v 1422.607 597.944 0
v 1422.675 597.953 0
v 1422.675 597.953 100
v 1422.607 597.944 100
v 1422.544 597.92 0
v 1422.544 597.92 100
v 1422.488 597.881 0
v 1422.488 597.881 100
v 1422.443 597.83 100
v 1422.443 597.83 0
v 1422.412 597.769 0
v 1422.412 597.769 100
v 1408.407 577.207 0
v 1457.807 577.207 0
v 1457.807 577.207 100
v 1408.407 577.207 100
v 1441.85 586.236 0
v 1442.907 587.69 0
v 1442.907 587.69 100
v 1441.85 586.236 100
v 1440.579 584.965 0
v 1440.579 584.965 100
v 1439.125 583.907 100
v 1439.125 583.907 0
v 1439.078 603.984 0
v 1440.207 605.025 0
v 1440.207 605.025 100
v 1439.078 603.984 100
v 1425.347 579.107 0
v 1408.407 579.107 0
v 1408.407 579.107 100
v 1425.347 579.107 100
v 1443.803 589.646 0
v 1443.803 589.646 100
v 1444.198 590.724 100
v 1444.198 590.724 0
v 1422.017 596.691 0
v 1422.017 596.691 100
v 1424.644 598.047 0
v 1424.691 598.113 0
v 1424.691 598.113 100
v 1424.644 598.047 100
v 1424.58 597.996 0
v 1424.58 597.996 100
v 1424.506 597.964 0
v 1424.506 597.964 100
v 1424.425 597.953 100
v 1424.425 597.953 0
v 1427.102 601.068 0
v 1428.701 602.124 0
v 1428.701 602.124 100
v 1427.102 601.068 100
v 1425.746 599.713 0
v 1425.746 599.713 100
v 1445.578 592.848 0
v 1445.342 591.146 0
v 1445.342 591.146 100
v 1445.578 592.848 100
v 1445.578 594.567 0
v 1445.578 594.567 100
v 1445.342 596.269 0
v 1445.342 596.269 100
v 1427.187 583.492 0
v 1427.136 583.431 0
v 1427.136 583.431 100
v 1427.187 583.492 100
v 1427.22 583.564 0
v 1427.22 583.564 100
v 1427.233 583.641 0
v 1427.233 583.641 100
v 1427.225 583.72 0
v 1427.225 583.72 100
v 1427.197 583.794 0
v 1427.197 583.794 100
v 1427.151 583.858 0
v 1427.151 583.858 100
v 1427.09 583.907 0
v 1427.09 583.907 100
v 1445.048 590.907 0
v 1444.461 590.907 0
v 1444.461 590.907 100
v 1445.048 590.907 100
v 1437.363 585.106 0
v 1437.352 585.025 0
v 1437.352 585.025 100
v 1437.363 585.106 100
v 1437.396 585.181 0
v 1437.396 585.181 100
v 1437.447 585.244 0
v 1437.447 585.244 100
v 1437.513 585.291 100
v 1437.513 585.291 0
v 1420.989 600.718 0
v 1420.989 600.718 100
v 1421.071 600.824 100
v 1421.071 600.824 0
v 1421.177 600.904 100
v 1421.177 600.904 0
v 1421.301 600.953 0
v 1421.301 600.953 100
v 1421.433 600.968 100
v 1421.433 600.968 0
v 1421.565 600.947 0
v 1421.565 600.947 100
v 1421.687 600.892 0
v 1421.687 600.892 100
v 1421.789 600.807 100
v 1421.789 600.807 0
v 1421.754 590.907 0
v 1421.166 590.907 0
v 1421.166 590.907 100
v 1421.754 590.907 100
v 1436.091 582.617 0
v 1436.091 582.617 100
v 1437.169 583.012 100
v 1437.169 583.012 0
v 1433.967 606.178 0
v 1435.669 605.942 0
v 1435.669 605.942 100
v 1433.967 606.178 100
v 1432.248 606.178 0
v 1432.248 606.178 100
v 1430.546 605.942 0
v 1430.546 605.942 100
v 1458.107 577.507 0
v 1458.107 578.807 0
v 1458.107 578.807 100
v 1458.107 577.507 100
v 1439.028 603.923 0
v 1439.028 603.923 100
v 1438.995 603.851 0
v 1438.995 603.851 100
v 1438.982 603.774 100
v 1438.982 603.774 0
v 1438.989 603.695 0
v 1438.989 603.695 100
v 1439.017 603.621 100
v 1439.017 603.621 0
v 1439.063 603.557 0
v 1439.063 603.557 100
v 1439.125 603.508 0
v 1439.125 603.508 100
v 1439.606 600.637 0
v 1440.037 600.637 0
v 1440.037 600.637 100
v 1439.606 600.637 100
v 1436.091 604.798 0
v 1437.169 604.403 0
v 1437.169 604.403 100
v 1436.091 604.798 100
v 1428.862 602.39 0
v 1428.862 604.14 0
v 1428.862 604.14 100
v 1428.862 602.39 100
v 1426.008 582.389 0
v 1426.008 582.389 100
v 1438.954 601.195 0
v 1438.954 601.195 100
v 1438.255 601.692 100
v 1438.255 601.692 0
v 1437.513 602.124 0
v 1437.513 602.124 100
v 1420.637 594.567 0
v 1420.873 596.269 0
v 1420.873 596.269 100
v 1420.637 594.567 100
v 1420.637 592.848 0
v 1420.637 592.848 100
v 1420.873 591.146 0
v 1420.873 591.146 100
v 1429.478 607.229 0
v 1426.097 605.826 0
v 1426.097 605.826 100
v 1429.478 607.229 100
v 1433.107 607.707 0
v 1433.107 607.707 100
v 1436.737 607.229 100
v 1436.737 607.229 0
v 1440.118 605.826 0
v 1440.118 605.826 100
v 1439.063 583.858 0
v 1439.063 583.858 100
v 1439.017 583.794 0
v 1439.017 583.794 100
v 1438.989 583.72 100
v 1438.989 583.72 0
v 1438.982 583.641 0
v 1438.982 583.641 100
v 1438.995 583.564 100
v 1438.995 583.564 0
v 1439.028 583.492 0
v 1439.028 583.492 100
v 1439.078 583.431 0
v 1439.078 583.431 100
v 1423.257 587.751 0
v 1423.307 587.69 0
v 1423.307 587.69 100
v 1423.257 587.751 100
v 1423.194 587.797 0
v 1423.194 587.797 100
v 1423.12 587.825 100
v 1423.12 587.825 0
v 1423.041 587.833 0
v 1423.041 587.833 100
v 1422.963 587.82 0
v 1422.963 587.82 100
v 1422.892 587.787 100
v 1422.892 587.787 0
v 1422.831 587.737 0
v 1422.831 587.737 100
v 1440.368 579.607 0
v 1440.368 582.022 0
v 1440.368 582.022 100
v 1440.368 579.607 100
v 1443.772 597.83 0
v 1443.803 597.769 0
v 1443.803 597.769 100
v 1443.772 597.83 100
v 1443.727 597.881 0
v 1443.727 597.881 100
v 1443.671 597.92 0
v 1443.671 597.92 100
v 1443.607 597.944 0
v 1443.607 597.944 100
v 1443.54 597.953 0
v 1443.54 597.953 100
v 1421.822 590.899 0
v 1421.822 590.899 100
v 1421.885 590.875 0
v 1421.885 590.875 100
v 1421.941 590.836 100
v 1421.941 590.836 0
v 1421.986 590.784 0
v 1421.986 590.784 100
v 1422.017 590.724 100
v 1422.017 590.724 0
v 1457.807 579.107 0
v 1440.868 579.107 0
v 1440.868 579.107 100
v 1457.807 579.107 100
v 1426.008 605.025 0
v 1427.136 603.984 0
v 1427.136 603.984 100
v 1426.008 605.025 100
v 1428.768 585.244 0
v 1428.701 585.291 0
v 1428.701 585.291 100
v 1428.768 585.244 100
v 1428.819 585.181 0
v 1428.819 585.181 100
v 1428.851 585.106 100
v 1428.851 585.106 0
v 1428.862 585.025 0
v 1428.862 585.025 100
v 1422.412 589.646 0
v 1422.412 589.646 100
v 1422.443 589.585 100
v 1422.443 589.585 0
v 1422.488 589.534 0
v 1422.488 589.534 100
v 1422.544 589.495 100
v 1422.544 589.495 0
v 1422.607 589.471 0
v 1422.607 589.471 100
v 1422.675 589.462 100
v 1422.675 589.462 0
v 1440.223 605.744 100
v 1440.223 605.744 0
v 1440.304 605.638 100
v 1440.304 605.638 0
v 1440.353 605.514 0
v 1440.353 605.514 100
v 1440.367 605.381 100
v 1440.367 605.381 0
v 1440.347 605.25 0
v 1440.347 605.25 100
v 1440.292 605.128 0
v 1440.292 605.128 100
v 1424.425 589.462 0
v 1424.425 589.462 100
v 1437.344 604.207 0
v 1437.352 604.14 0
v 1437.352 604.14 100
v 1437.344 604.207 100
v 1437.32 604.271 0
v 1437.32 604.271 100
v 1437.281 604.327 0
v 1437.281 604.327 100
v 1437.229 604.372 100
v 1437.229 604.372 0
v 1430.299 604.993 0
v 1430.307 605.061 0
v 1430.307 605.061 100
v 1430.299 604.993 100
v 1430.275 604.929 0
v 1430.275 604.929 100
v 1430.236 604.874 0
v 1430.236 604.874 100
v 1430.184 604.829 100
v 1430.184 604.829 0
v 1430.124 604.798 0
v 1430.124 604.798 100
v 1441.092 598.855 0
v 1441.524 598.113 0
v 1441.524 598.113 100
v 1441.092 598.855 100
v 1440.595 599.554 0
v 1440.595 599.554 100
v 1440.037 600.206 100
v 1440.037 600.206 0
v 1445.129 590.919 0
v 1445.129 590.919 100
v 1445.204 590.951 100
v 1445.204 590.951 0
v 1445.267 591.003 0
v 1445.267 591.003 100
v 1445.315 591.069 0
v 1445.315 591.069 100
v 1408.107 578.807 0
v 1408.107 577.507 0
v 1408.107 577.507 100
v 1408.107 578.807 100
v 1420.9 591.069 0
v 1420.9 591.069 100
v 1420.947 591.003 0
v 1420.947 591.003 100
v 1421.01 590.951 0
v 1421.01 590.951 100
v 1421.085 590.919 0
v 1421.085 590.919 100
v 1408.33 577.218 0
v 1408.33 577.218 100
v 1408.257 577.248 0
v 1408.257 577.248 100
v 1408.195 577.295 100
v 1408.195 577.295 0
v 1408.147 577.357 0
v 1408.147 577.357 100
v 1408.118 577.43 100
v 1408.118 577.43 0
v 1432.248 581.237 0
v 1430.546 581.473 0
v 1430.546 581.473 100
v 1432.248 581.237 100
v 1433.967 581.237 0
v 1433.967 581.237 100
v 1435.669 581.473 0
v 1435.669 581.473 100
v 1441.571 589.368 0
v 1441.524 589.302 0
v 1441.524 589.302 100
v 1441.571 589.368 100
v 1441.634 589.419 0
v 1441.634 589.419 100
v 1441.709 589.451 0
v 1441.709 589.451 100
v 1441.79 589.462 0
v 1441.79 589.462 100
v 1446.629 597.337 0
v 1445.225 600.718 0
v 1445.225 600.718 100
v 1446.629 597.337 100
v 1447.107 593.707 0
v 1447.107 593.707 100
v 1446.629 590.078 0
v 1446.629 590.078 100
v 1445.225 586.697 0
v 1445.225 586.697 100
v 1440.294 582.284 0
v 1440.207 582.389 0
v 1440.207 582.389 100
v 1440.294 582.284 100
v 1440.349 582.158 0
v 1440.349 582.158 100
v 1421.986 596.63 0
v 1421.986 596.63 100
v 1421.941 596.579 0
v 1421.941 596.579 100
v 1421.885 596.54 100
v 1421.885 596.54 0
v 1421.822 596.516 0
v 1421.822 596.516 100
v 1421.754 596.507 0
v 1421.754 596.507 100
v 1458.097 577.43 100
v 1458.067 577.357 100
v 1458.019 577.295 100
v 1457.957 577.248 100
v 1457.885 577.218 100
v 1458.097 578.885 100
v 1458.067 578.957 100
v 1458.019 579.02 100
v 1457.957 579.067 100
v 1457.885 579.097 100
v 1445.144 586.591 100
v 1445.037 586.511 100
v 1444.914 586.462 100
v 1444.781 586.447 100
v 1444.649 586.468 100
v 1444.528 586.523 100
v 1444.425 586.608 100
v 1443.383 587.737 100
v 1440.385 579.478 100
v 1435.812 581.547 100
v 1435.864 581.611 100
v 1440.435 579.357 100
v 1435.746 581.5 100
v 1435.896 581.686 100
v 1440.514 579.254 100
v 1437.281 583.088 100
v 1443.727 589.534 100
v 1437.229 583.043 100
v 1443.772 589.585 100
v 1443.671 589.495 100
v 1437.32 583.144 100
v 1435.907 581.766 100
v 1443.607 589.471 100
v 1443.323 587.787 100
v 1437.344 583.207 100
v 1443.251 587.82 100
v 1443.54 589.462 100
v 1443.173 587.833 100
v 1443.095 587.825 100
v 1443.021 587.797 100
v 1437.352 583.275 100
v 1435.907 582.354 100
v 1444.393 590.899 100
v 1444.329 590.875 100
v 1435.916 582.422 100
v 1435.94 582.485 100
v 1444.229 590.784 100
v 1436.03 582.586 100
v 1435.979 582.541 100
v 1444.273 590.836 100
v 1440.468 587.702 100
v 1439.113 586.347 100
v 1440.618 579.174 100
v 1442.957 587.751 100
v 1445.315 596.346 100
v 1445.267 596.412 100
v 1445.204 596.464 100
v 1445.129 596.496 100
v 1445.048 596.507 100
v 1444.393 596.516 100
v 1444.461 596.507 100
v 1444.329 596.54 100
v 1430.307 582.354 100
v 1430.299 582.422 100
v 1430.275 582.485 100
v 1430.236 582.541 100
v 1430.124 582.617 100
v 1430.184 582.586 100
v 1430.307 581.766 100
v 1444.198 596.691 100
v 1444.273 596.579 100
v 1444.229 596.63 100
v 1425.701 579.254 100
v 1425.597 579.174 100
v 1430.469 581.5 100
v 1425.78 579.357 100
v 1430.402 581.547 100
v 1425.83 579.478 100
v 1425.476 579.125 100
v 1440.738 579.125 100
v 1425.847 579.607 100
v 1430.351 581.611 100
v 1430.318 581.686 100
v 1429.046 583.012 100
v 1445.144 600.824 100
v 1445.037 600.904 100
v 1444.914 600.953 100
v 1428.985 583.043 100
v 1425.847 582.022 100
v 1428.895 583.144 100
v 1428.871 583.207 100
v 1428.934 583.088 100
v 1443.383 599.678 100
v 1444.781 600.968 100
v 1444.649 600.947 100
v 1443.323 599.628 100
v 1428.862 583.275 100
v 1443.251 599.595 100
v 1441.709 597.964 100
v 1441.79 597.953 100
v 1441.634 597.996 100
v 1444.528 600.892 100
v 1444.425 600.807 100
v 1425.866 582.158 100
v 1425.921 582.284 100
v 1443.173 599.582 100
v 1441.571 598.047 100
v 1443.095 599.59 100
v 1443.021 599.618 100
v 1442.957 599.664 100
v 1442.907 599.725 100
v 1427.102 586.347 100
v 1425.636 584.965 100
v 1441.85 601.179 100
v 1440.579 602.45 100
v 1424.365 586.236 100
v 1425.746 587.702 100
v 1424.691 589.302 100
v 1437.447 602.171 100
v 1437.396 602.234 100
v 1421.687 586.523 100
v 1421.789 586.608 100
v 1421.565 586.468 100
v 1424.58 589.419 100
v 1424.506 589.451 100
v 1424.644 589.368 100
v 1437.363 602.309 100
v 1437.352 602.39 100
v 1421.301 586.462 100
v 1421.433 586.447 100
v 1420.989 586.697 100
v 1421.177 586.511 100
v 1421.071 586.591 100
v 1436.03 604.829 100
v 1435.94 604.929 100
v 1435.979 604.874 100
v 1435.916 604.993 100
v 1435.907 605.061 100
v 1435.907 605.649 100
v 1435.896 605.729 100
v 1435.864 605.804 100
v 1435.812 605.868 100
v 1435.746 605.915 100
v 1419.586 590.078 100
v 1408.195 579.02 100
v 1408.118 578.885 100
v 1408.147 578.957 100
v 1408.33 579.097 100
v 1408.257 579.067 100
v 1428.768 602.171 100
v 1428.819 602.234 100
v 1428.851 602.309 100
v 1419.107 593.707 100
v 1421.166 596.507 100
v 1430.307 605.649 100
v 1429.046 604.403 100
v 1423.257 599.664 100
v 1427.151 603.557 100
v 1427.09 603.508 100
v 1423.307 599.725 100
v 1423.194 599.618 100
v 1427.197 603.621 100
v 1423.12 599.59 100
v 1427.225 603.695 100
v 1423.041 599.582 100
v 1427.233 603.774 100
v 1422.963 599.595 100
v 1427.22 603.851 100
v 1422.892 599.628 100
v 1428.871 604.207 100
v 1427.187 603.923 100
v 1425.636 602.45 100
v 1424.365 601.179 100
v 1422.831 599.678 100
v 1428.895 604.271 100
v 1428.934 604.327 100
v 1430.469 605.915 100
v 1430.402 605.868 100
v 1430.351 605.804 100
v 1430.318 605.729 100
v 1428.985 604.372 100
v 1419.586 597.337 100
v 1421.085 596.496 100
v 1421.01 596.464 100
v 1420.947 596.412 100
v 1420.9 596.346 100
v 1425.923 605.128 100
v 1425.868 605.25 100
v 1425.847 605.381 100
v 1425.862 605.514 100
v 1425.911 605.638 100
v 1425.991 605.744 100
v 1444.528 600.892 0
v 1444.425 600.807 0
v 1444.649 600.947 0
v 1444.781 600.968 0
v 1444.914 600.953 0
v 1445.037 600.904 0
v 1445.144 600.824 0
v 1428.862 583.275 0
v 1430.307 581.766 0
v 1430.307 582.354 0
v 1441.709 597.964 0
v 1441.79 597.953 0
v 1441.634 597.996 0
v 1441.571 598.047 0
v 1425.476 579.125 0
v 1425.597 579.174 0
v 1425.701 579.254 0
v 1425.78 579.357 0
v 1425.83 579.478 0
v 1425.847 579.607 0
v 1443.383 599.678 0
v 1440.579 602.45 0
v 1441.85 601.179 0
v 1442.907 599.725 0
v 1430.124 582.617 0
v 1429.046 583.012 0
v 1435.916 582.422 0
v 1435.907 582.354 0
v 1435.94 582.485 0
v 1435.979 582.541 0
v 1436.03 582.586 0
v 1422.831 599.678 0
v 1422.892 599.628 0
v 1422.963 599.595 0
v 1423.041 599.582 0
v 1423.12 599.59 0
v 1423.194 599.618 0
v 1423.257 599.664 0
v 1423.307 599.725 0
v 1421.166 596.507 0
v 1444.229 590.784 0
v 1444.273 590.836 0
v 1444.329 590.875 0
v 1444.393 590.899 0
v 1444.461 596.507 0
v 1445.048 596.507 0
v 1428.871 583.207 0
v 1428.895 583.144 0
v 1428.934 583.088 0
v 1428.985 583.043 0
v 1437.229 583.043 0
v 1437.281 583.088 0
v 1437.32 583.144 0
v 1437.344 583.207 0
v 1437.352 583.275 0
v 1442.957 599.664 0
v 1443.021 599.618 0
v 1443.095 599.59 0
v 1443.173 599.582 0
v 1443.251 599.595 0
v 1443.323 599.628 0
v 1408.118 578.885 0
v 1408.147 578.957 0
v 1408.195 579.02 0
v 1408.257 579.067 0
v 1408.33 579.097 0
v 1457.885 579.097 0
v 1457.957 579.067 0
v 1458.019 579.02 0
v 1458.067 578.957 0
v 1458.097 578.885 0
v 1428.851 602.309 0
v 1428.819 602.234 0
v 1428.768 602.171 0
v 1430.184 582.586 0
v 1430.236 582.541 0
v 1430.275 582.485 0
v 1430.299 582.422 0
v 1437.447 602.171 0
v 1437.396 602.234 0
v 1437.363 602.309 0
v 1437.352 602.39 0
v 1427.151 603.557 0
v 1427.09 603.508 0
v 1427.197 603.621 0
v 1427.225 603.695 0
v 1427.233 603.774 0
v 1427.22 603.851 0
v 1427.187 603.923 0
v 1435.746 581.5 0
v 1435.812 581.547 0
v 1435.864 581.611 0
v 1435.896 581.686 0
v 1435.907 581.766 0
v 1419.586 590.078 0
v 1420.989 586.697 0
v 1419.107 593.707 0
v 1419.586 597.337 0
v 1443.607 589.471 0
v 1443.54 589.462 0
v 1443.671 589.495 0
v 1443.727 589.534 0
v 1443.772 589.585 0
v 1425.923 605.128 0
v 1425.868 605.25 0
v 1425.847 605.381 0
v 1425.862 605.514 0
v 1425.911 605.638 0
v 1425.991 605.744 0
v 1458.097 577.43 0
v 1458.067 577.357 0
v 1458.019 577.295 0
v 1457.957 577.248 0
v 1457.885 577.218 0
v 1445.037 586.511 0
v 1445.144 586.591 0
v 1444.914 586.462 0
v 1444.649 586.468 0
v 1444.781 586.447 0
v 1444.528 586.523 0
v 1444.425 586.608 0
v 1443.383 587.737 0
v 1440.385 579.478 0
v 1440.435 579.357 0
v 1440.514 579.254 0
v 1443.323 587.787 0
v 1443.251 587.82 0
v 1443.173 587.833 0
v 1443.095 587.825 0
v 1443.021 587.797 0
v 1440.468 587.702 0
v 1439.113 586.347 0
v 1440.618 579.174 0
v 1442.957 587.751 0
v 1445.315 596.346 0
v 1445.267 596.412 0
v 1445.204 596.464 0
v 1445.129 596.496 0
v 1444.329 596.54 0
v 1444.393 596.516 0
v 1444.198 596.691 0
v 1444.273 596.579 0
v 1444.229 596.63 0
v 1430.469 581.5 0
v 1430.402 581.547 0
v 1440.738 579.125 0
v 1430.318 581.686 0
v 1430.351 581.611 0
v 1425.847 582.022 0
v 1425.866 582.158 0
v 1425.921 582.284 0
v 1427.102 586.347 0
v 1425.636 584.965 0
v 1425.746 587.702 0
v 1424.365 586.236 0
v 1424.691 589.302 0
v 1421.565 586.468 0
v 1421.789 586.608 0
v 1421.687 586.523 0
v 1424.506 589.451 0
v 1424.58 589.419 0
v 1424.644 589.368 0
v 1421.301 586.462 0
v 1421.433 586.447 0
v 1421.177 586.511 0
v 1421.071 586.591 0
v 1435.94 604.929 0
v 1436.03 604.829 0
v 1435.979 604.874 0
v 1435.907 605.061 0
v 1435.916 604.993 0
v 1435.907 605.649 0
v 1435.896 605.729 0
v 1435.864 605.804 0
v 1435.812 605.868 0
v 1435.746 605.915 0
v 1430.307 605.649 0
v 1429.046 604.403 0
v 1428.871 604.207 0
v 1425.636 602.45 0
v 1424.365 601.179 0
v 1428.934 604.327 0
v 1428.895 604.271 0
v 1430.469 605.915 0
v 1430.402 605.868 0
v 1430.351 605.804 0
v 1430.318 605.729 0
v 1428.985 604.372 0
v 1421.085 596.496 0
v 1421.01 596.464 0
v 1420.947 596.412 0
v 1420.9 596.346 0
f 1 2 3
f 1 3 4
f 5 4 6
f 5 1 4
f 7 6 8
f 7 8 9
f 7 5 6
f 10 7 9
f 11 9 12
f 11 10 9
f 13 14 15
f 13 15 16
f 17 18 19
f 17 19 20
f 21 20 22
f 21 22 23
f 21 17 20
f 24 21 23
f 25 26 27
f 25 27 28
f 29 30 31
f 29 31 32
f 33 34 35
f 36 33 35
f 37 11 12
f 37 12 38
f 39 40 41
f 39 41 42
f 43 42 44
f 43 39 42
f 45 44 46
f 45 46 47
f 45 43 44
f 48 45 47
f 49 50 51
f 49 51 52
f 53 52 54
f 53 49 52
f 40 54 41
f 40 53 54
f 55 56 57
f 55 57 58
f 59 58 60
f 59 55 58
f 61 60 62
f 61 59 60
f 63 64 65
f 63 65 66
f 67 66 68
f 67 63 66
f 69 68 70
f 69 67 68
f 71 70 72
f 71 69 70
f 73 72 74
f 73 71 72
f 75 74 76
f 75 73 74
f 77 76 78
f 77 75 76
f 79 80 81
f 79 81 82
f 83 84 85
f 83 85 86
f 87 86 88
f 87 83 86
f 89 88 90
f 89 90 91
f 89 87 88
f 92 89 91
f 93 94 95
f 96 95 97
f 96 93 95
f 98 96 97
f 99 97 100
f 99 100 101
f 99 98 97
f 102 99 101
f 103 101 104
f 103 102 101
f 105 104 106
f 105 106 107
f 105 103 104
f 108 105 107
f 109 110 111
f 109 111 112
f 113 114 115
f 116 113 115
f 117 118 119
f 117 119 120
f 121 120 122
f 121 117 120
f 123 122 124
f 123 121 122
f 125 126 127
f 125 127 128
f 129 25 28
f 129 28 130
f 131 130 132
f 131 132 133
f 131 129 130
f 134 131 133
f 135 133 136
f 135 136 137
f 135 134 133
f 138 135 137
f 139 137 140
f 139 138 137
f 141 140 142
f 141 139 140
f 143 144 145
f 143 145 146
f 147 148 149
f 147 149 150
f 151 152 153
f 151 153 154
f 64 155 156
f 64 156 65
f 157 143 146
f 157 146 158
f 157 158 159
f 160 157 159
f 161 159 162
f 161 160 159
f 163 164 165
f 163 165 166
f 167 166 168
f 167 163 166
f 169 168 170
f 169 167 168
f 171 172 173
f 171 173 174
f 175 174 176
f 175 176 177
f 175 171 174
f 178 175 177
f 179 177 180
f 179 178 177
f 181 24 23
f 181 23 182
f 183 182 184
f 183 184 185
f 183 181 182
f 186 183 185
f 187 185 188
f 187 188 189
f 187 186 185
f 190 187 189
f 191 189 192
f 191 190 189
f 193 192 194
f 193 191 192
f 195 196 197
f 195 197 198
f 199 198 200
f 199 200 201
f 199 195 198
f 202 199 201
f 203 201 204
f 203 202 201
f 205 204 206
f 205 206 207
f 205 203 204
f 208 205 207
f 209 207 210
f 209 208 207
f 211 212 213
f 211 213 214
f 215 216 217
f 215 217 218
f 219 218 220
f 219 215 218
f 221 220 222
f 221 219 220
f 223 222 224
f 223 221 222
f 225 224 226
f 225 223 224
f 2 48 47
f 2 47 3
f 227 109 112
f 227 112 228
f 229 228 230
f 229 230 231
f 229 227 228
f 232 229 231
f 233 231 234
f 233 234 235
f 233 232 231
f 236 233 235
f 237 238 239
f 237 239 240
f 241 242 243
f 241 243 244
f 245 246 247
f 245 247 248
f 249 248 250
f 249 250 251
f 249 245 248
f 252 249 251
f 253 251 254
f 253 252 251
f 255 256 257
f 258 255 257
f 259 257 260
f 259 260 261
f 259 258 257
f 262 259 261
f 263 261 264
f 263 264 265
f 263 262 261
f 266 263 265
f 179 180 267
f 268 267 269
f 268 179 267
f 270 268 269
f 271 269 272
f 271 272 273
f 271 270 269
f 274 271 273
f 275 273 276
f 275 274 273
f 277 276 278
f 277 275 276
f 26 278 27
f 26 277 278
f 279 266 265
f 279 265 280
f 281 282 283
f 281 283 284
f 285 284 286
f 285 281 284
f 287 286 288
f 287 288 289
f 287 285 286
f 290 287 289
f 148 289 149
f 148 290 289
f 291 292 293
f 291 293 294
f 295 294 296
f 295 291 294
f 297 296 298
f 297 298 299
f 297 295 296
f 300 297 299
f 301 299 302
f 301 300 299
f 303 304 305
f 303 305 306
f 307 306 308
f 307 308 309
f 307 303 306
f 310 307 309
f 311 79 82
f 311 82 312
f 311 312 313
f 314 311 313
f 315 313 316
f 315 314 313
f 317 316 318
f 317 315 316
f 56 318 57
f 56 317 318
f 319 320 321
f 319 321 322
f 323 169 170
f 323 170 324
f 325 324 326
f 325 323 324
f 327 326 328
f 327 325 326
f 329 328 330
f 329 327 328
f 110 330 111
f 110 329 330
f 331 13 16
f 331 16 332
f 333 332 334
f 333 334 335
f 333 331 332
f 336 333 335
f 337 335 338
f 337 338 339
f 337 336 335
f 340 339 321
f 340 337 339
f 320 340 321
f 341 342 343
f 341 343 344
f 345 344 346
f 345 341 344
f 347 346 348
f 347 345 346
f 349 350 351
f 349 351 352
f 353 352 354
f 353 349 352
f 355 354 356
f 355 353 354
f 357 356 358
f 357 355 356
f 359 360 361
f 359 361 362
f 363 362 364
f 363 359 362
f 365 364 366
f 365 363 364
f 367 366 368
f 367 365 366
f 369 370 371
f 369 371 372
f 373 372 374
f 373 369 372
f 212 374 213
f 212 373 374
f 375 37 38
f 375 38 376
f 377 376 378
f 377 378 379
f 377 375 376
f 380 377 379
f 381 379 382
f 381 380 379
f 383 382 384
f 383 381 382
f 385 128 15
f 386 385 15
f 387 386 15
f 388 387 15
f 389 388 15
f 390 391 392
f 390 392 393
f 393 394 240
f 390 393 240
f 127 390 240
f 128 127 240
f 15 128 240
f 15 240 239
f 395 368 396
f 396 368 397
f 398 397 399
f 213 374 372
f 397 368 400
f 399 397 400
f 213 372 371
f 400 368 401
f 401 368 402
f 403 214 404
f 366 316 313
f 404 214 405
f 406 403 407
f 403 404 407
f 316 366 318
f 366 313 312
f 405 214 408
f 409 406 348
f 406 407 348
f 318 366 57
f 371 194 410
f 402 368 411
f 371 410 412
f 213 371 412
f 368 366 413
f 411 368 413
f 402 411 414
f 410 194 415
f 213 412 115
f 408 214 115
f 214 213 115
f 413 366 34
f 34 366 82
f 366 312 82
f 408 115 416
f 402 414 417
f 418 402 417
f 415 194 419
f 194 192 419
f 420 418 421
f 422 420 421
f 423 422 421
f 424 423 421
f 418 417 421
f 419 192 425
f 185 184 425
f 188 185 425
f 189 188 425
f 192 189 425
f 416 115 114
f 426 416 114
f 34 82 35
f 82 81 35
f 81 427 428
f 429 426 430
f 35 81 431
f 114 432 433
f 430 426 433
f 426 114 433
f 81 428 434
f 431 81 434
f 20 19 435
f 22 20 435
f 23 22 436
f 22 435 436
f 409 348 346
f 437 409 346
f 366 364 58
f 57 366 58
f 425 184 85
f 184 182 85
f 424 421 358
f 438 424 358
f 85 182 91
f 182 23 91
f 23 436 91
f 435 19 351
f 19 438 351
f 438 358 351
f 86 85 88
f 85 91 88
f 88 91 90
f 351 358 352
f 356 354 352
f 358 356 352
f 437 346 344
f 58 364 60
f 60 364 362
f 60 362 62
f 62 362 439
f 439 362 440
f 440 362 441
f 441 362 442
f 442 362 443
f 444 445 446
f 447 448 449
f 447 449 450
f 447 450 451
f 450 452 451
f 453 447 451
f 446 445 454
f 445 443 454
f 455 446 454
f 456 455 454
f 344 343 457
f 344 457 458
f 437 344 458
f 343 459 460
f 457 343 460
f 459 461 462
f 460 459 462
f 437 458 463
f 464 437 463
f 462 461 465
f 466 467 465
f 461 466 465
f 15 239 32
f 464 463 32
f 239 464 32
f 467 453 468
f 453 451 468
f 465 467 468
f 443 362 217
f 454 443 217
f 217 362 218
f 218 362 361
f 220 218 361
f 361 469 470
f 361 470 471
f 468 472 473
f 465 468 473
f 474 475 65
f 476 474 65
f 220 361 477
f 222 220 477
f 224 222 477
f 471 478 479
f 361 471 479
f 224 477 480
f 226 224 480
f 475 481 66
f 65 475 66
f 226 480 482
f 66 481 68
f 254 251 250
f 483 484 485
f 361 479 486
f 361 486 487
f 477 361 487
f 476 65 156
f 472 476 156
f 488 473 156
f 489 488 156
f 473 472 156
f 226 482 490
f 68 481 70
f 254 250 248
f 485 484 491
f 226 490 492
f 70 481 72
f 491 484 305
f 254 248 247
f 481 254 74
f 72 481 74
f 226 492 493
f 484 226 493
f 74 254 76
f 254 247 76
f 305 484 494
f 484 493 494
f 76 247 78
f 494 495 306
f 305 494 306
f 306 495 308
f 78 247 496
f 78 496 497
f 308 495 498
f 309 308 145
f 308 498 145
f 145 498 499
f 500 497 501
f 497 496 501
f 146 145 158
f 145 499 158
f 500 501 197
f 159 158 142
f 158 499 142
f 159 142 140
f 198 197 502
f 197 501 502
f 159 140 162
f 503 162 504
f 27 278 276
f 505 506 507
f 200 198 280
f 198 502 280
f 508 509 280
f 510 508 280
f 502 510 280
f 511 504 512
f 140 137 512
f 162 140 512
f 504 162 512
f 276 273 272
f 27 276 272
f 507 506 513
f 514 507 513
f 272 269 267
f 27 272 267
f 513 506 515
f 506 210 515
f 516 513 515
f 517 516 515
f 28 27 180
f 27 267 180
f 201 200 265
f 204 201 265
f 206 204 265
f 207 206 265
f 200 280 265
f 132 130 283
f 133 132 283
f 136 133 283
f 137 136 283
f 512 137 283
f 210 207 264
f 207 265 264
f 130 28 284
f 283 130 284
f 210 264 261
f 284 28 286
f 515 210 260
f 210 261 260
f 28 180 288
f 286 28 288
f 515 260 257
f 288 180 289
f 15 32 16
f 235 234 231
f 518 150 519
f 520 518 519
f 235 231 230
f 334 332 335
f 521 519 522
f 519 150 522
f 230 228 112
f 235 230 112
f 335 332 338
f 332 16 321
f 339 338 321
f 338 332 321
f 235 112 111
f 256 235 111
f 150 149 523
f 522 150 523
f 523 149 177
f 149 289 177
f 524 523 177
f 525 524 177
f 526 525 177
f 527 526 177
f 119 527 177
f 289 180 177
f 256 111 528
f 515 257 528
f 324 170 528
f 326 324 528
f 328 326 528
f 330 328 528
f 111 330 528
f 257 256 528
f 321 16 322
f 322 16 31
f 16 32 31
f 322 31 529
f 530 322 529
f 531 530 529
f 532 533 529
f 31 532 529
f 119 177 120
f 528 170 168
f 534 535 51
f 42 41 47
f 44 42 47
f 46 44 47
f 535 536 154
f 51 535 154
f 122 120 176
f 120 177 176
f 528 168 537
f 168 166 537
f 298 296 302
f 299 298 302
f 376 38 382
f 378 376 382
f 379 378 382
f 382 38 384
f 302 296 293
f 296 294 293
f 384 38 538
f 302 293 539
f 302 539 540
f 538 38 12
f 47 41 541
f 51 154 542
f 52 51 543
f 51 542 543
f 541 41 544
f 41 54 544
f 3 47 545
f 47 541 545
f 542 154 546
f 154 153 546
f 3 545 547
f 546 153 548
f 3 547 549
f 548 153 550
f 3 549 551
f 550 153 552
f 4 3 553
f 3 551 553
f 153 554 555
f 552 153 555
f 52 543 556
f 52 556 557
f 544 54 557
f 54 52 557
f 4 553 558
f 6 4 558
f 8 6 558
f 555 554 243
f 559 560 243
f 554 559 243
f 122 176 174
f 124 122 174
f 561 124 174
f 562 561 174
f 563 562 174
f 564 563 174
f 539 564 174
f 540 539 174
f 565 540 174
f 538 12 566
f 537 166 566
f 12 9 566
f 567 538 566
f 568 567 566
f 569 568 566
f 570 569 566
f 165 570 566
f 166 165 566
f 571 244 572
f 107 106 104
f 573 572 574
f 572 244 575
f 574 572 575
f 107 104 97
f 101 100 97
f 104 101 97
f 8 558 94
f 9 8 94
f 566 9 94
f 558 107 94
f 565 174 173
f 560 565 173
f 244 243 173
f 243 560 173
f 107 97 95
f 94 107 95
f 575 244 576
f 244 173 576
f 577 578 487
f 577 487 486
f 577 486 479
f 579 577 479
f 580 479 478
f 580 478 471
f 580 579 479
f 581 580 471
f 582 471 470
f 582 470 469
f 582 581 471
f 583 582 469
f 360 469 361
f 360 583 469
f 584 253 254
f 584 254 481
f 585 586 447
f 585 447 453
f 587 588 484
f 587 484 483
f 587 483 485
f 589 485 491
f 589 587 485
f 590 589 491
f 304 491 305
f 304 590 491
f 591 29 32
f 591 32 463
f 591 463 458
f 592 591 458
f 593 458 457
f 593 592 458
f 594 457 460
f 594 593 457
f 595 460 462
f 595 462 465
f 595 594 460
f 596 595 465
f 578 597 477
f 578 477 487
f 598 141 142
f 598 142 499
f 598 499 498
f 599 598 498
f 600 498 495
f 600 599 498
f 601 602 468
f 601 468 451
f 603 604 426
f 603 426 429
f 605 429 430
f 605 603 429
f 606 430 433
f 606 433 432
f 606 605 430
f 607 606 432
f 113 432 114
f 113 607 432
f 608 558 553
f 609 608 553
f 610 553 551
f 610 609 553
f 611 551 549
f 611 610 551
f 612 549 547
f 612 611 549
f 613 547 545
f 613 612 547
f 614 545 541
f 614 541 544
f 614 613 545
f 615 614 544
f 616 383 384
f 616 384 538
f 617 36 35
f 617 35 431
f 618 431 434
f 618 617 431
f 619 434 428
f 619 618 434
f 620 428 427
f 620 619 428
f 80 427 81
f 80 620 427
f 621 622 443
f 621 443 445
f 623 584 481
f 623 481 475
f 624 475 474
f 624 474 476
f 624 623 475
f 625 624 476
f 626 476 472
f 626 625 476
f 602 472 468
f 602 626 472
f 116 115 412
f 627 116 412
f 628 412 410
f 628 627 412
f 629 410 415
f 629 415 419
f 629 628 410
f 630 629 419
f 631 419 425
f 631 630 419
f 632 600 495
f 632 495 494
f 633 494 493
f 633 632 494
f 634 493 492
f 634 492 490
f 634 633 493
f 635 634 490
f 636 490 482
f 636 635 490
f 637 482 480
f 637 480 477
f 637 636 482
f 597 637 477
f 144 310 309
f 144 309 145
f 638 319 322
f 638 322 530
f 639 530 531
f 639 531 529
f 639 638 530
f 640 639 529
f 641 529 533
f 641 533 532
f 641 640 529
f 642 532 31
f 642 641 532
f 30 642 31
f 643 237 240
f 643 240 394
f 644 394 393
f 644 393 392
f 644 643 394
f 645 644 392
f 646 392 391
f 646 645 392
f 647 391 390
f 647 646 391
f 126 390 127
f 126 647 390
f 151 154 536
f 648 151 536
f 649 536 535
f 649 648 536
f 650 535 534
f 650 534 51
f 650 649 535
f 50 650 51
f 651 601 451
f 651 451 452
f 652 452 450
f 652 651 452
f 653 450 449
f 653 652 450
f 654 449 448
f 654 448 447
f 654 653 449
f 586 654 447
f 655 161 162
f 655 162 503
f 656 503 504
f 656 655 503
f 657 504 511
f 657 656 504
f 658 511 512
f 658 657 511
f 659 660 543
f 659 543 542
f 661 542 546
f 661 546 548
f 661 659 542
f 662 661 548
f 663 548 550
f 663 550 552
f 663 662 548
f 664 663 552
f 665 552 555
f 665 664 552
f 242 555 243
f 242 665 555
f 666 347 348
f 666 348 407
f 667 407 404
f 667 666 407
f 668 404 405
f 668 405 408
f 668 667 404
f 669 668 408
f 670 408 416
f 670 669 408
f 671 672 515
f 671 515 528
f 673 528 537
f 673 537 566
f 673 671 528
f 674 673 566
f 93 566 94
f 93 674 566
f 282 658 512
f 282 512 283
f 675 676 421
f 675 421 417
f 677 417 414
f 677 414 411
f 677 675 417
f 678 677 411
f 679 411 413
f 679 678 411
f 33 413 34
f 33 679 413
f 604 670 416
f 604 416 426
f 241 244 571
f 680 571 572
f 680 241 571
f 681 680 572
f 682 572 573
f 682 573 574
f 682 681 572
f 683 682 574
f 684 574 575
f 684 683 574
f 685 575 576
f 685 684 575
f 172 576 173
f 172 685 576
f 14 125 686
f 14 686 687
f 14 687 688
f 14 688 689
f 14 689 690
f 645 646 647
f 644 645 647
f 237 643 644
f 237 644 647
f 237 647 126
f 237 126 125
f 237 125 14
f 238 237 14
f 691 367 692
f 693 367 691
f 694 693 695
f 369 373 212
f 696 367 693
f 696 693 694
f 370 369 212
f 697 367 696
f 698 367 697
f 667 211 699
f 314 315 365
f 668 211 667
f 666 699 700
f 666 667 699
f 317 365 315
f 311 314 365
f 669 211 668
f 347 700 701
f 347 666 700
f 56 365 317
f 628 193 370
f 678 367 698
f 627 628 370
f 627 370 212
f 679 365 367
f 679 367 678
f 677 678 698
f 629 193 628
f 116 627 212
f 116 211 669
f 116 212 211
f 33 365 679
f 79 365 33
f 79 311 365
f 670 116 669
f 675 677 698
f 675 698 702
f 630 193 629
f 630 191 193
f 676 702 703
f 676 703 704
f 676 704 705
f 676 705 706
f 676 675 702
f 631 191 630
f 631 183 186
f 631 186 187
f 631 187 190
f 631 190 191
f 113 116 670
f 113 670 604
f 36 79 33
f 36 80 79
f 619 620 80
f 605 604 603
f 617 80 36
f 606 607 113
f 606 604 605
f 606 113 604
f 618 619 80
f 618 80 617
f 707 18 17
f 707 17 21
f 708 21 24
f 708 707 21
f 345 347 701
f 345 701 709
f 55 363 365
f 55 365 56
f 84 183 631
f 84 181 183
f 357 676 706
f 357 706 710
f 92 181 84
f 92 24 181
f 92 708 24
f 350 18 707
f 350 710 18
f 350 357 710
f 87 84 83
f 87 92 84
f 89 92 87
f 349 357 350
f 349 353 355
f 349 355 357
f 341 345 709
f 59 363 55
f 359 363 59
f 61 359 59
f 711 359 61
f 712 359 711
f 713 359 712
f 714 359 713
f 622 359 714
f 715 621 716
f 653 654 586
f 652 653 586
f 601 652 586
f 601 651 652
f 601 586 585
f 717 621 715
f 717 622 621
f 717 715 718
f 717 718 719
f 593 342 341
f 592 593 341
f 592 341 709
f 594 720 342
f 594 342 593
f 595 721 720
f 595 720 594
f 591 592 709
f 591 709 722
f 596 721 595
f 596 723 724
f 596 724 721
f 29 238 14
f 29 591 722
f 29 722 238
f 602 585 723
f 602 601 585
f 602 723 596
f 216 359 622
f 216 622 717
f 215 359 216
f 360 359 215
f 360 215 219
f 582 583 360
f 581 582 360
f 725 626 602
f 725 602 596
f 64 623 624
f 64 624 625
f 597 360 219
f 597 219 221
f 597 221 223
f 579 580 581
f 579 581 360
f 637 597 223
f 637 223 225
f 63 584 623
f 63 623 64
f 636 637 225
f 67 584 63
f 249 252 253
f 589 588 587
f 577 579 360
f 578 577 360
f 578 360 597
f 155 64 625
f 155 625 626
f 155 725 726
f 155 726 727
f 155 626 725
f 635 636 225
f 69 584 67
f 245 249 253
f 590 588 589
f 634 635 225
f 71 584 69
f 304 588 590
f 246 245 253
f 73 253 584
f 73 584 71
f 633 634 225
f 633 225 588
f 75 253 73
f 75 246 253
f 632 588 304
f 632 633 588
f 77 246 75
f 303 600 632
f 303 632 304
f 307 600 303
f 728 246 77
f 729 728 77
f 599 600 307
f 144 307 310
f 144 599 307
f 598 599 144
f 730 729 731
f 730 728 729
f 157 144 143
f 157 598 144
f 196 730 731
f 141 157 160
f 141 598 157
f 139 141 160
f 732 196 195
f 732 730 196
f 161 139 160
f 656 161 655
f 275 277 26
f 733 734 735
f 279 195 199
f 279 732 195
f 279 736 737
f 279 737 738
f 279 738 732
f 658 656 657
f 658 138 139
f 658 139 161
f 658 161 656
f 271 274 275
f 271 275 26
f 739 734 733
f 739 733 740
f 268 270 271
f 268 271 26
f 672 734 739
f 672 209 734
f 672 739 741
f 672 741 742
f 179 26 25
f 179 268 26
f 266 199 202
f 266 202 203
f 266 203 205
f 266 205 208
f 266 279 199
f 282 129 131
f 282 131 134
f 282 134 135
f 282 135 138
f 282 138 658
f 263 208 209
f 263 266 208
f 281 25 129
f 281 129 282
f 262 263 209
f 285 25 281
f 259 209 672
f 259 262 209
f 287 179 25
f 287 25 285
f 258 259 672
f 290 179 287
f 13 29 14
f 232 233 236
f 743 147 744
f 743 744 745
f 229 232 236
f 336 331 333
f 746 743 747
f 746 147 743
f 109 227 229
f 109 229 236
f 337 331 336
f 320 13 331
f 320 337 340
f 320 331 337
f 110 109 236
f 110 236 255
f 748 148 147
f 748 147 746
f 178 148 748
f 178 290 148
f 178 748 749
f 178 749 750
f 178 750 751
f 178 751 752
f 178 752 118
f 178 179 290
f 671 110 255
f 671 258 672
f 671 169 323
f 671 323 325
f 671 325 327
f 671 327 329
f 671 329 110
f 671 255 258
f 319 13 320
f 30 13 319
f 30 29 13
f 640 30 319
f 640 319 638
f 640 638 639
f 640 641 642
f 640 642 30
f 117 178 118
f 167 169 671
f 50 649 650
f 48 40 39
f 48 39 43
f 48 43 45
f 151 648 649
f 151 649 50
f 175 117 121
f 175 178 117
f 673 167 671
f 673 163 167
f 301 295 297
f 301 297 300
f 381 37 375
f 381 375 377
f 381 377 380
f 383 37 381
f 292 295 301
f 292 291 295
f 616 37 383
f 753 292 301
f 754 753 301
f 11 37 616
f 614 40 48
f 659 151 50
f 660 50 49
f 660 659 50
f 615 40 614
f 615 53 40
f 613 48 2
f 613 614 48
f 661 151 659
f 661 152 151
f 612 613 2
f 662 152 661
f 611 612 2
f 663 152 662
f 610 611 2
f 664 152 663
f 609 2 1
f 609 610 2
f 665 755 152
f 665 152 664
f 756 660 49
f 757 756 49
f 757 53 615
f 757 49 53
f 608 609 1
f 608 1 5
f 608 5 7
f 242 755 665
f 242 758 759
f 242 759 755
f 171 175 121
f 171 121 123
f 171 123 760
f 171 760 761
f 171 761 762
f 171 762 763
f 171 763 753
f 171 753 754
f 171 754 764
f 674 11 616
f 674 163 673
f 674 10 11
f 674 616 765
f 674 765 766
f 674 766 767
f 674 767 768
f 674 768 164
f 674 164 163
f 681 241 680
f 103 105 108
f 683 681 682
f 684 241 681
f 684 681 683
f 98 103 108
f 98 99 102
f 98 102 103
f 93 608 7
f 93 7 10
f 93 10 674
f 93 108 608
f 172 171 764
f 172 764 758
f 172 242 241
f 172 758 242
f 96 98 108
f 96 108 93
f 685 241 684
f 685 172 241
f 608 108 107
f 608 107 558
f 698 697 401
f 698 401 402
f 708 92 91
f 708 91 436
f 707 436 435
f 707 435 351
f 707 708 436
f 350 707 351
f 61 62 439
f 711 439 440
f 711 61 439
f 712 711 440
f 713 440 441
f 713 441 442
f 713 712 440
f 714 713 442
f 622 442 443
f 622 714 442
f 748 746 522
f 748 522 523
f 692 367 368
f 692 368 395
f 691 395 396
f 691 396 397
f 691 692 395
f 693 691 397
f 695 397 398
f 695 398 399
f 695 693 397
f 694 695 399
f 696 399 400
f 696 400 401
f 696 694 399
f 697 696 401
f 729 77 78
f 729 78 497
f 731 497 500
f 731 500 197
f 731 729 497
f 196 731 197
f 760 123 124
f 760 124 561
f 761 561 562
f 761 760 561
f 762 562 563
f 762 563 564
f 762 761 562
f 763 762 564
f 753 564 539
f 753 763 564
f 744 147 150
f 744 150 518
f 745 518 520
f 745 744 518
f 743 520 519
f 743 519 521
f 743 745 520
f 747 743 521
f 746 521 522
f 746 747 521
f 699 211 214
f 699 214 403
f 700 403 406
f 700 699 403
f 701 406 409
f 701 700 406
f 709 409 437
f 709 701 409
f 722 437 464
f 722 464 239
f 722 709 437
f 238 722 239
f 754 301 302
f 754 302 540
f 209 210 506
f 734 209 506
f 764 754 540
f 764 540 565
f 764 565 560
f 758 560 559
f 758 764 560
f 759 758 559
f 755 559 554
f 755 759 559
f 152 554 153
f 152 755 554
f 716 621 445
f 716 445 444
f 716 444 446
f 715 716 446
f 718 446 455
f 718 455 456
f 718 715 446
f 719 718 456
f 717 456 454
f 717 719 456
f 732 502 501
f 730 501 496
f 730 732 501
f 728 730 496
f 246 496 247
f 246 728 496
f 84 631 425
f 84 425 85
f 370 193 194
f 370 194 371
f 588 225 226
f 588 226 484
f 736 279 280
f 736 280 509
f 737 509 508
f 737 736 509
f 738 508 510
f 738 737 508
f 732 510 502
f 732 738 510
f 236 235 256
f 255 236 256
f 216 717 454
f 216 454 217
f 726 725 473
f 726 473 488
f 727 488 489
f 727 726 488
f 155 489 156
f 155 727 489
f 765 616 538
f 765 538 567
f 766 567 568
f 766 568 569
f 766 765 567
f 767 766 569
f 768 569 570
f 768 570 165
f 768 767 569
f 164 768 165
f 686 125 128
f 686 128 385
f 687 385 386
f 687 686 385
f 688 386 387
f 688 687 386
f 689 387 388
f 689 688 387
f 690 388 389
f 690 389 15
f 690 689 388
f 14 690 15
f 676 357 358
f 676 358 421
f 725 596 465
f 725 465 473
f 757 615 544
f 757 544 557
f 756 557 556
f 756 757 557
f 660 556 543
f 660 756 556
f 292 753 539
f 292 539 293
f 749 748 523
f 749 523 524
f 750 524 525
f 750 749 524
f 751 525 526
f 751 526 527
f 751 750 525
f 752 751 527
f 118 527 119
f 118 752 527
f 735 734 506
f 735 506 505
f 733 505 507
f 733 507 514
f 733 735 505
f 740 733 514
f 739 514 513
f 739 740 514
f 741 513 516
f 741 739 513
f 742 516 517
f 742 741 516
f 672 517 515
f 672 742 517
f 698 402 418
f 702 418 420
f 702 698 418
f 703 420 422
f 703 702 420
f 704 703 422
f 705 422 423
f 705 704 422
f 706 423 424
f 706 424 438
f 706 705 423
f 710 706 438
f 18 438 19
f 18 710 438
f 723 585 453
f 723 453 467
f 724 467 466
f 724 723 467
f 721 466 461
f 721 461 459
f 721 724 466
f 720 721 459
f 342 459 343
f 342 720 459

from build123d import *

# Parameters (mm, degrees)
EXTRUDE_1_DEPTH = 100


with BuildPart() as part:
    # Model → 凸台-拉伸1 (new body)
    with BuildSketch(Plane.XY):
        with BuildLine():
            Line((1440.867570561, 579.107478259), (1452.807293918, 579.107478259))
            Line((1452.807293918, 579.107478259), (1457.807293918, 579.107478259))
            ThreePointArc((1457.807293918, 579.107478259), (1458.019425952, 579.019610294), (1458.107293918, 578.807478259))
            Line((1458.107293918, 578.807478259), (1458.107293918, 577.507478259))
            ThreePointArc((1458.107293918, 577.507478259), (1458.019425952, 577.295346225), (1457.807293918, 577.207478259))
            Line((1457.807293918, 577.207478259), (1408.407293918, 577.207478259))
            ThreePointArc((1408.407293918, 577.207478259), (1408.195161884, 577.295346225), (1408.107293918, 577.507478259))
            Line((1408.107293918, 577.507478259), (1408.107293918, 578.807478259))
            ThreePointArc((1408.107293918, 578.807478259), (1408.195161884, 579.019610294), (1408.407293918, 579.107478259))
            Line((1408.407293918, 579.107478259), (1425.347017276, 579.107478259))
            ThreePointArc((1425.347017276, 579.107478259), (1425.700570666, 579.253924869), (1425.847017276, 579.607478259))
            Line((1425.847017276, 579.607478259), (1425.847017276, 582.022074556))
            ThreePointArc((1425.847017276, 582.022074556), (1425.888989436, 582.222600109), (1426.007859266, 582.389459701))
            Line((1426.007859266, 582.389459701), (1427.136441813, 583.431330379))
            ThreePointArc((1427.136441813, 583.431330379), (1427.231524995, 583.680936543), (1427.089921929, 583.907415283))
            ThreePointArc((1427.089921929, 583.907415283), (1424.975565934, 585.575750276), (1423.307230942, 587.69010627))
            ThreePointArc((1423.307230942, 587.69010627), (1423.080752201, 587.831709337), (1422.831146038, 587.736626154))
            Line((1422.831146038, 587.736626154), (1421.789275359, 586.608043608))
            ThreePointArc((1421.789275359, 586.608043608), (1421.366754977, 586.450250809), (1420.989097485, 586.696821001))
            ThreePointArc((1420.989097485, 586.696821001), (1419.107293918, 593.707478259), (1420.989097485, 600.718135518))
            ThreePointArc((1420.989097485, 600.718135518), (1421.366754977, 600.96470571), (1421.789275359, 600.806912911))
            Line((1421.789275359, 600.806912911), (1422.831146038, 599.678330364))
            ThreePointArc((1422.831146038, 599.678330364), (1423.080752201, 599.583247182), (1423.307230942, 599.724850249))
            ThreePointArc((1423.307230942, 599.724850249), (1424.975565934, 601.839206243), (1427.089921929, 603.507541236))
            ThreePointArc((1427.089921929, 603.507541236), (1427.231524995, 603.734019976), (1427.136441813, 603.98362614))
            Line((1427.136441813, 603.98362614), (1426.007859266, 605.025496818))
            ThreePointArc((1426.007859266, 605.025496818), (1425.850066468, 605.448017201), (1426.096636659, 605.825674693))
            ThreePointArc((1426.096636659, 605.825674693), (1433.107293918, 607.707478259), (1440.117951177, 605.825674693))
            ThreePointArc((1440.117951177, 605.825674693), (1440.364521369, 605.448017201), (1440.20672857, 605.025496818))
            Line((1440.20672857, 605.025496818), (1439.078146023, 603.98362614))
            ThreePointArc((1439.078146023, 603.98362614), (1438.983062841, 603.734019976), (1439.124665907, 603.507541236))
            ThreePointArc((1439.124665907, 603.507541236), (1441.239021902, 601.839206243), (1442.907356895, 599.724850249))
            ThreePointArc((1442.907356895, 599.724850249), (1443.133835635, 599.583247182), (1443.383441798, 599.678330364))
            Line((1443.383441798, 599.678330364), (1444.425312477, 600.806912911))
            ThreePointArc((1444.425312477, 600.806912911), (1444.847832859, 600.96470571), (1445.225490352, 600.718135518))
            ThreePointArc((1445.225490352, 600.718135518), (1447.107293918, 593.707478259), (1445.225490352, 586.696821001))
            ThreePointArc((1445.225490352, 586.696821001), (1444.847832859, 586.450250809), (1444.425312477, 586.608043608))
            Line((1444.425312477, 586.608043608), (1443.383441798, 587.736626154))
            ThreePointArc((1443.383441798, 587.736626154), (1443.133835635, 587.831709337), (1442.907356895, 587.69010627))
            ThreePointArc((1442.907356895, 587.69010627), (1441.239021902, 585.575750276), (1439.124665907, 583.907415283))
            ThreePointArc((1439.124665907, 583.907415283), (1438.983062841, 583.680936543), (1439.078146023, 583.431330379))
            Line((1439.078146023, 583.431330379), (1440.20672857, 582.389459701))
            ThreePointArc((1440.20672857, 582.389459701), (1440.325598401, 582.222600109), (1440.367570561, 582.022074556))
            Line((1440.367570561, 582.022074556), (1440.367570561, 579.607478259))
            ThreePointArc((1440.367570561, 579.607478259), (1440.51401717, 579.253924869), (1440.867570561, 579.107478259))
        make_face()
        with BuildLine():
            Line((1421.166188442, 590.907478259), (1421.754066124, 590.907478259))
            ThreePointArc((1421.754066124, 590.907478259), (1421.914408846, 590.857021745), (1422.016963461, 590.723836915))
            Line((1422.016963461, 590.723836915), (1422.411999107, 589.64605289))
            ThreePointArc((1422.411999107, 589.64605289), (1422.514553722, 589.51286806), (1422.674896444, 589.462411545))
            Line((1422.674896444, 589.462411545), (1424.424991887, 589.462411545))
            ThreePointArc((1424.424991887, 589.462411545), (1424.58032957, 589.419063458), (1424.690776643, 589.30154624))
            ThreePointArc((1424.690776643, 589.30154624), (1426.389779497, 586.989963838), (1428.701361899, 585.290960984))
            ThreePointArc((1428.701361899, 585.290960984), (1428.818879117, 585.180513911), (1428.862227204, 585.025176228))
            Line((1428.862227204, 585.025176228), (1428.862227204, 583.275080785))
            ThreePointArc((1428.862227204, 583.275080785), (1428.912683718, 583.114738064), (1429.045868549, 583.012183448))
            Line((1429.045868549, 583.012183448), (1430.123652573, 582.617147802))
            ThreePointArc((1430.123652573, 582.617147802), (1430.256837404, 582.514593187), (1430.307293918, 582.354250466))
            Line((1430.307293918, 582.354250466), (1430.307293918, 581.766372783))
            ThreePointArc((1430.307293918, 581.766372783), (1430.374439218, 581.577220229), (1430.545818508, 581.472739042))
            ThreePointArc((1430.545818508, 581.472739042), (1433.107293918, 581.207478259), (1435.668769328, 581.472739042))
            ThreePointArc((1435.668769328, 581.472739042), (1435.840148618, 581.577220229), (1435.907293918, 581.766372783))
            Line((1435.907293918, 581.766372783), (1435.907293918, 582.354250466))
            ThreePointArc((1435.907293918, 582.354250466), (1435.957750433, 582.514593187), (1436.090935263, 582.617147802))
            Line((1436.090935263, 582.617147802), (1437.168719288, 583.012183448))
            ThreePointArc((1437.168719288, 583.012183448), (1437.301904118, 583.114738064), (1437.352360632, 583.275080785))
            Line((1437.352360632, 583.275080785), (1437.352360632, 585.025176228))
            ThreePointArc((1437.352360632, 585.025176228), (1437.39570872, 585.180513911), (1437.513225937, 585.290960984))
            ThreePointArc((1437.513225937, 585.290960984), (1439.824808339, 586.989963838), (1441.523811193, 589.30154624))
            ThreePointArc((1441.523811193, 589.30154624), (1441.634258267, 589.419063458), (1441.789595949, 589.462411545))
            Line((1441.789595949, 589.462411545), (1443.539691393, 589.462411545))
            ThreePointArc((1443.539691393, 589.462411545), (1443.700034114, 589.51286806), (1443.802588729, 589.64605289))
            Line((1443.802588729, 589.64605289), (1444.197624375, 590.723836915))
            ThreePointArc((1444.197624375, 590.723836915), (1444.300178991, 590.857021745), (1444.460521712, 590.907478259))
            Line((1444.460521712, 590.907478259), (1445.048399395, 590.907478259))
            ThreePointArc((1445.048399395, 590.907478259), (1445.237551948, 590.974623559), (1445.342033136, 591.14600285))
            ThreePointArc((1445.342033136, 591.14600285), (1445.607293918, 593.707478259), (1445.342033136, 596.268953669))
            ThreePointArc((1445.342033136, 596.268953669), (1445.237551948, 596.44033296), (1445.048399395, 596.507478259))
            Line((1445.048399395, 596.507478259), (1444.460521712, 596.507478259))
            ThreePointArc((1444.460521712, 596.507478259), (1444.300178991, 596.557934774), (1444.197624375, 596.691119604))
            Line((1444.197624375, 596.691119604), (1443.802588729, 597.768903629))
            ThreePointArc((1443.802588729, 597.768903629), (1443.700034114, 597.902088459), (1443.539691393, 597.952544974))
            Line((1443.539691393, 597.952544974), (1441.789595949, 597.952544974))
            ThreePointArc((1441.789595949, 597.952544974), (1441.634258267, 597.995893061), (1441.523811193, 598.113410278))
            ThreePointArc((1441.523811193, 598.113410278), (1440.851379085, 599.210127161), (1440.036940374, 600.205939616))
            Line((1440.036940374, 600.205939616), (1440.036940374, 600.637124715))
            Line((1440.036940374, 600.637124715), (1439.605755274, 600.637124715))
            ThreePointArc((1439.605755274, 600.637124715), (1438.609942819, 601.451563426), (1437.513225937, 602.123995535))
            ThreePointArc((1437.513225937, 602.123995535), (1437.39570872, 602.234442608), (1437.352360632, 602.389780291))
            Line((1437.352360632, 602.389780291), (1437.352360632, 604.139875734))
            ThreePointArc((1437.352360632, 604.139875734), (1437.301904118, 604.300218455), (1437.168719288, 604.402773071))
            Line((1437.168719288, 604.402773071), (1436.090935263, 604.797808717))
            ThreePointArc((1436.090935263, 604.797808717), (1435.957750433, 604.900363332), (1435.907293918, 605.060706053))
            Line((1435.907293918, 605.060706053), (1435.907293918, 605.648583736))
            ThreePointArc((1435.907293918, 605.648583736), (1435.840148618, 605.837736289), (1435.668769328, 605.942217477))
            ThreePointArc((1435.668769328, 605.942217477), (1433.107293918, 606.207478259), (1430.545818508, 605.942217477))
            ThreePointArc((1430.545818508, 605.942217477), (1430.374439218, 605.837736289), (1430.307293918, 605.648583736))
            Line((1430.307293918, 605.648583736), (1430.307293918, 605.060706053))
            ThreePointArc((1430.307293918, 605.060706053), (1430.256837404, 604.900363332), (1430.123652573, 604.797808717))
            Line((1430.123652573, 604.797808717), (1429.045868549, 604.402773071))
            ThreePointArc((1429.045868549, 604.402773071), (1428.912683718, 604.300218455), (1428.862227204, 604.139875734))
            Line((1428.862227204, 604.139875734), (1428.862227204, 602.389780291))
            ThreePointArc((1428.862227204, 602.389780291), (1428.818879117, 602.234442608), (1428.701361899, 602.123995535))
            ThreePointArc((1428.701361899, 602.123995535), (1426.389779497, 600.424992681), (1424.690776643, 598.113410278))
            ThreePointArc((1424.690776643, 598.113410278), (1424.58032957, 597.995893061), (1424.424991887, 597.952544974))
            Line((1424.424991887, 597.952544974), (1422.674896444, 597.952544974))
            ThreePointArc((1422.674896444, 597.952544974), (1422.514553722, 597.902088459), (1422.411999107, 597.768903629))
            Line((1422.411999107, 597.768903629), (1422.016963461, 596.691119604))
            ThreePointArc((1422.016963461, 596.691119604), (1421.914408846, 596.557934774), (1421.754066124, 596.507478259))
            Line((1421.754066124, 596.507478259), (1421.166188442, 596.507478259))
            ThreePointArc((1421.166188442, 596.507478259), (1420.977035888, 596.44033296), (1420.8725547, 596.268953669))
            ThreePointArc((1420.8725547, 596.268953669), (1420.607293918, 593.707478259), (1420.8725547, 591.14600285))
            ThreePointArc((1420.8725547, 591.14600285), (1420.977035888, 590.974623559), (1421.166188442, 590.907478259))
        make_face(mode=Mode.SUBTRACT)
    extrude(amount=EXTRUDE_1_DEPTH)


solid = part.part
